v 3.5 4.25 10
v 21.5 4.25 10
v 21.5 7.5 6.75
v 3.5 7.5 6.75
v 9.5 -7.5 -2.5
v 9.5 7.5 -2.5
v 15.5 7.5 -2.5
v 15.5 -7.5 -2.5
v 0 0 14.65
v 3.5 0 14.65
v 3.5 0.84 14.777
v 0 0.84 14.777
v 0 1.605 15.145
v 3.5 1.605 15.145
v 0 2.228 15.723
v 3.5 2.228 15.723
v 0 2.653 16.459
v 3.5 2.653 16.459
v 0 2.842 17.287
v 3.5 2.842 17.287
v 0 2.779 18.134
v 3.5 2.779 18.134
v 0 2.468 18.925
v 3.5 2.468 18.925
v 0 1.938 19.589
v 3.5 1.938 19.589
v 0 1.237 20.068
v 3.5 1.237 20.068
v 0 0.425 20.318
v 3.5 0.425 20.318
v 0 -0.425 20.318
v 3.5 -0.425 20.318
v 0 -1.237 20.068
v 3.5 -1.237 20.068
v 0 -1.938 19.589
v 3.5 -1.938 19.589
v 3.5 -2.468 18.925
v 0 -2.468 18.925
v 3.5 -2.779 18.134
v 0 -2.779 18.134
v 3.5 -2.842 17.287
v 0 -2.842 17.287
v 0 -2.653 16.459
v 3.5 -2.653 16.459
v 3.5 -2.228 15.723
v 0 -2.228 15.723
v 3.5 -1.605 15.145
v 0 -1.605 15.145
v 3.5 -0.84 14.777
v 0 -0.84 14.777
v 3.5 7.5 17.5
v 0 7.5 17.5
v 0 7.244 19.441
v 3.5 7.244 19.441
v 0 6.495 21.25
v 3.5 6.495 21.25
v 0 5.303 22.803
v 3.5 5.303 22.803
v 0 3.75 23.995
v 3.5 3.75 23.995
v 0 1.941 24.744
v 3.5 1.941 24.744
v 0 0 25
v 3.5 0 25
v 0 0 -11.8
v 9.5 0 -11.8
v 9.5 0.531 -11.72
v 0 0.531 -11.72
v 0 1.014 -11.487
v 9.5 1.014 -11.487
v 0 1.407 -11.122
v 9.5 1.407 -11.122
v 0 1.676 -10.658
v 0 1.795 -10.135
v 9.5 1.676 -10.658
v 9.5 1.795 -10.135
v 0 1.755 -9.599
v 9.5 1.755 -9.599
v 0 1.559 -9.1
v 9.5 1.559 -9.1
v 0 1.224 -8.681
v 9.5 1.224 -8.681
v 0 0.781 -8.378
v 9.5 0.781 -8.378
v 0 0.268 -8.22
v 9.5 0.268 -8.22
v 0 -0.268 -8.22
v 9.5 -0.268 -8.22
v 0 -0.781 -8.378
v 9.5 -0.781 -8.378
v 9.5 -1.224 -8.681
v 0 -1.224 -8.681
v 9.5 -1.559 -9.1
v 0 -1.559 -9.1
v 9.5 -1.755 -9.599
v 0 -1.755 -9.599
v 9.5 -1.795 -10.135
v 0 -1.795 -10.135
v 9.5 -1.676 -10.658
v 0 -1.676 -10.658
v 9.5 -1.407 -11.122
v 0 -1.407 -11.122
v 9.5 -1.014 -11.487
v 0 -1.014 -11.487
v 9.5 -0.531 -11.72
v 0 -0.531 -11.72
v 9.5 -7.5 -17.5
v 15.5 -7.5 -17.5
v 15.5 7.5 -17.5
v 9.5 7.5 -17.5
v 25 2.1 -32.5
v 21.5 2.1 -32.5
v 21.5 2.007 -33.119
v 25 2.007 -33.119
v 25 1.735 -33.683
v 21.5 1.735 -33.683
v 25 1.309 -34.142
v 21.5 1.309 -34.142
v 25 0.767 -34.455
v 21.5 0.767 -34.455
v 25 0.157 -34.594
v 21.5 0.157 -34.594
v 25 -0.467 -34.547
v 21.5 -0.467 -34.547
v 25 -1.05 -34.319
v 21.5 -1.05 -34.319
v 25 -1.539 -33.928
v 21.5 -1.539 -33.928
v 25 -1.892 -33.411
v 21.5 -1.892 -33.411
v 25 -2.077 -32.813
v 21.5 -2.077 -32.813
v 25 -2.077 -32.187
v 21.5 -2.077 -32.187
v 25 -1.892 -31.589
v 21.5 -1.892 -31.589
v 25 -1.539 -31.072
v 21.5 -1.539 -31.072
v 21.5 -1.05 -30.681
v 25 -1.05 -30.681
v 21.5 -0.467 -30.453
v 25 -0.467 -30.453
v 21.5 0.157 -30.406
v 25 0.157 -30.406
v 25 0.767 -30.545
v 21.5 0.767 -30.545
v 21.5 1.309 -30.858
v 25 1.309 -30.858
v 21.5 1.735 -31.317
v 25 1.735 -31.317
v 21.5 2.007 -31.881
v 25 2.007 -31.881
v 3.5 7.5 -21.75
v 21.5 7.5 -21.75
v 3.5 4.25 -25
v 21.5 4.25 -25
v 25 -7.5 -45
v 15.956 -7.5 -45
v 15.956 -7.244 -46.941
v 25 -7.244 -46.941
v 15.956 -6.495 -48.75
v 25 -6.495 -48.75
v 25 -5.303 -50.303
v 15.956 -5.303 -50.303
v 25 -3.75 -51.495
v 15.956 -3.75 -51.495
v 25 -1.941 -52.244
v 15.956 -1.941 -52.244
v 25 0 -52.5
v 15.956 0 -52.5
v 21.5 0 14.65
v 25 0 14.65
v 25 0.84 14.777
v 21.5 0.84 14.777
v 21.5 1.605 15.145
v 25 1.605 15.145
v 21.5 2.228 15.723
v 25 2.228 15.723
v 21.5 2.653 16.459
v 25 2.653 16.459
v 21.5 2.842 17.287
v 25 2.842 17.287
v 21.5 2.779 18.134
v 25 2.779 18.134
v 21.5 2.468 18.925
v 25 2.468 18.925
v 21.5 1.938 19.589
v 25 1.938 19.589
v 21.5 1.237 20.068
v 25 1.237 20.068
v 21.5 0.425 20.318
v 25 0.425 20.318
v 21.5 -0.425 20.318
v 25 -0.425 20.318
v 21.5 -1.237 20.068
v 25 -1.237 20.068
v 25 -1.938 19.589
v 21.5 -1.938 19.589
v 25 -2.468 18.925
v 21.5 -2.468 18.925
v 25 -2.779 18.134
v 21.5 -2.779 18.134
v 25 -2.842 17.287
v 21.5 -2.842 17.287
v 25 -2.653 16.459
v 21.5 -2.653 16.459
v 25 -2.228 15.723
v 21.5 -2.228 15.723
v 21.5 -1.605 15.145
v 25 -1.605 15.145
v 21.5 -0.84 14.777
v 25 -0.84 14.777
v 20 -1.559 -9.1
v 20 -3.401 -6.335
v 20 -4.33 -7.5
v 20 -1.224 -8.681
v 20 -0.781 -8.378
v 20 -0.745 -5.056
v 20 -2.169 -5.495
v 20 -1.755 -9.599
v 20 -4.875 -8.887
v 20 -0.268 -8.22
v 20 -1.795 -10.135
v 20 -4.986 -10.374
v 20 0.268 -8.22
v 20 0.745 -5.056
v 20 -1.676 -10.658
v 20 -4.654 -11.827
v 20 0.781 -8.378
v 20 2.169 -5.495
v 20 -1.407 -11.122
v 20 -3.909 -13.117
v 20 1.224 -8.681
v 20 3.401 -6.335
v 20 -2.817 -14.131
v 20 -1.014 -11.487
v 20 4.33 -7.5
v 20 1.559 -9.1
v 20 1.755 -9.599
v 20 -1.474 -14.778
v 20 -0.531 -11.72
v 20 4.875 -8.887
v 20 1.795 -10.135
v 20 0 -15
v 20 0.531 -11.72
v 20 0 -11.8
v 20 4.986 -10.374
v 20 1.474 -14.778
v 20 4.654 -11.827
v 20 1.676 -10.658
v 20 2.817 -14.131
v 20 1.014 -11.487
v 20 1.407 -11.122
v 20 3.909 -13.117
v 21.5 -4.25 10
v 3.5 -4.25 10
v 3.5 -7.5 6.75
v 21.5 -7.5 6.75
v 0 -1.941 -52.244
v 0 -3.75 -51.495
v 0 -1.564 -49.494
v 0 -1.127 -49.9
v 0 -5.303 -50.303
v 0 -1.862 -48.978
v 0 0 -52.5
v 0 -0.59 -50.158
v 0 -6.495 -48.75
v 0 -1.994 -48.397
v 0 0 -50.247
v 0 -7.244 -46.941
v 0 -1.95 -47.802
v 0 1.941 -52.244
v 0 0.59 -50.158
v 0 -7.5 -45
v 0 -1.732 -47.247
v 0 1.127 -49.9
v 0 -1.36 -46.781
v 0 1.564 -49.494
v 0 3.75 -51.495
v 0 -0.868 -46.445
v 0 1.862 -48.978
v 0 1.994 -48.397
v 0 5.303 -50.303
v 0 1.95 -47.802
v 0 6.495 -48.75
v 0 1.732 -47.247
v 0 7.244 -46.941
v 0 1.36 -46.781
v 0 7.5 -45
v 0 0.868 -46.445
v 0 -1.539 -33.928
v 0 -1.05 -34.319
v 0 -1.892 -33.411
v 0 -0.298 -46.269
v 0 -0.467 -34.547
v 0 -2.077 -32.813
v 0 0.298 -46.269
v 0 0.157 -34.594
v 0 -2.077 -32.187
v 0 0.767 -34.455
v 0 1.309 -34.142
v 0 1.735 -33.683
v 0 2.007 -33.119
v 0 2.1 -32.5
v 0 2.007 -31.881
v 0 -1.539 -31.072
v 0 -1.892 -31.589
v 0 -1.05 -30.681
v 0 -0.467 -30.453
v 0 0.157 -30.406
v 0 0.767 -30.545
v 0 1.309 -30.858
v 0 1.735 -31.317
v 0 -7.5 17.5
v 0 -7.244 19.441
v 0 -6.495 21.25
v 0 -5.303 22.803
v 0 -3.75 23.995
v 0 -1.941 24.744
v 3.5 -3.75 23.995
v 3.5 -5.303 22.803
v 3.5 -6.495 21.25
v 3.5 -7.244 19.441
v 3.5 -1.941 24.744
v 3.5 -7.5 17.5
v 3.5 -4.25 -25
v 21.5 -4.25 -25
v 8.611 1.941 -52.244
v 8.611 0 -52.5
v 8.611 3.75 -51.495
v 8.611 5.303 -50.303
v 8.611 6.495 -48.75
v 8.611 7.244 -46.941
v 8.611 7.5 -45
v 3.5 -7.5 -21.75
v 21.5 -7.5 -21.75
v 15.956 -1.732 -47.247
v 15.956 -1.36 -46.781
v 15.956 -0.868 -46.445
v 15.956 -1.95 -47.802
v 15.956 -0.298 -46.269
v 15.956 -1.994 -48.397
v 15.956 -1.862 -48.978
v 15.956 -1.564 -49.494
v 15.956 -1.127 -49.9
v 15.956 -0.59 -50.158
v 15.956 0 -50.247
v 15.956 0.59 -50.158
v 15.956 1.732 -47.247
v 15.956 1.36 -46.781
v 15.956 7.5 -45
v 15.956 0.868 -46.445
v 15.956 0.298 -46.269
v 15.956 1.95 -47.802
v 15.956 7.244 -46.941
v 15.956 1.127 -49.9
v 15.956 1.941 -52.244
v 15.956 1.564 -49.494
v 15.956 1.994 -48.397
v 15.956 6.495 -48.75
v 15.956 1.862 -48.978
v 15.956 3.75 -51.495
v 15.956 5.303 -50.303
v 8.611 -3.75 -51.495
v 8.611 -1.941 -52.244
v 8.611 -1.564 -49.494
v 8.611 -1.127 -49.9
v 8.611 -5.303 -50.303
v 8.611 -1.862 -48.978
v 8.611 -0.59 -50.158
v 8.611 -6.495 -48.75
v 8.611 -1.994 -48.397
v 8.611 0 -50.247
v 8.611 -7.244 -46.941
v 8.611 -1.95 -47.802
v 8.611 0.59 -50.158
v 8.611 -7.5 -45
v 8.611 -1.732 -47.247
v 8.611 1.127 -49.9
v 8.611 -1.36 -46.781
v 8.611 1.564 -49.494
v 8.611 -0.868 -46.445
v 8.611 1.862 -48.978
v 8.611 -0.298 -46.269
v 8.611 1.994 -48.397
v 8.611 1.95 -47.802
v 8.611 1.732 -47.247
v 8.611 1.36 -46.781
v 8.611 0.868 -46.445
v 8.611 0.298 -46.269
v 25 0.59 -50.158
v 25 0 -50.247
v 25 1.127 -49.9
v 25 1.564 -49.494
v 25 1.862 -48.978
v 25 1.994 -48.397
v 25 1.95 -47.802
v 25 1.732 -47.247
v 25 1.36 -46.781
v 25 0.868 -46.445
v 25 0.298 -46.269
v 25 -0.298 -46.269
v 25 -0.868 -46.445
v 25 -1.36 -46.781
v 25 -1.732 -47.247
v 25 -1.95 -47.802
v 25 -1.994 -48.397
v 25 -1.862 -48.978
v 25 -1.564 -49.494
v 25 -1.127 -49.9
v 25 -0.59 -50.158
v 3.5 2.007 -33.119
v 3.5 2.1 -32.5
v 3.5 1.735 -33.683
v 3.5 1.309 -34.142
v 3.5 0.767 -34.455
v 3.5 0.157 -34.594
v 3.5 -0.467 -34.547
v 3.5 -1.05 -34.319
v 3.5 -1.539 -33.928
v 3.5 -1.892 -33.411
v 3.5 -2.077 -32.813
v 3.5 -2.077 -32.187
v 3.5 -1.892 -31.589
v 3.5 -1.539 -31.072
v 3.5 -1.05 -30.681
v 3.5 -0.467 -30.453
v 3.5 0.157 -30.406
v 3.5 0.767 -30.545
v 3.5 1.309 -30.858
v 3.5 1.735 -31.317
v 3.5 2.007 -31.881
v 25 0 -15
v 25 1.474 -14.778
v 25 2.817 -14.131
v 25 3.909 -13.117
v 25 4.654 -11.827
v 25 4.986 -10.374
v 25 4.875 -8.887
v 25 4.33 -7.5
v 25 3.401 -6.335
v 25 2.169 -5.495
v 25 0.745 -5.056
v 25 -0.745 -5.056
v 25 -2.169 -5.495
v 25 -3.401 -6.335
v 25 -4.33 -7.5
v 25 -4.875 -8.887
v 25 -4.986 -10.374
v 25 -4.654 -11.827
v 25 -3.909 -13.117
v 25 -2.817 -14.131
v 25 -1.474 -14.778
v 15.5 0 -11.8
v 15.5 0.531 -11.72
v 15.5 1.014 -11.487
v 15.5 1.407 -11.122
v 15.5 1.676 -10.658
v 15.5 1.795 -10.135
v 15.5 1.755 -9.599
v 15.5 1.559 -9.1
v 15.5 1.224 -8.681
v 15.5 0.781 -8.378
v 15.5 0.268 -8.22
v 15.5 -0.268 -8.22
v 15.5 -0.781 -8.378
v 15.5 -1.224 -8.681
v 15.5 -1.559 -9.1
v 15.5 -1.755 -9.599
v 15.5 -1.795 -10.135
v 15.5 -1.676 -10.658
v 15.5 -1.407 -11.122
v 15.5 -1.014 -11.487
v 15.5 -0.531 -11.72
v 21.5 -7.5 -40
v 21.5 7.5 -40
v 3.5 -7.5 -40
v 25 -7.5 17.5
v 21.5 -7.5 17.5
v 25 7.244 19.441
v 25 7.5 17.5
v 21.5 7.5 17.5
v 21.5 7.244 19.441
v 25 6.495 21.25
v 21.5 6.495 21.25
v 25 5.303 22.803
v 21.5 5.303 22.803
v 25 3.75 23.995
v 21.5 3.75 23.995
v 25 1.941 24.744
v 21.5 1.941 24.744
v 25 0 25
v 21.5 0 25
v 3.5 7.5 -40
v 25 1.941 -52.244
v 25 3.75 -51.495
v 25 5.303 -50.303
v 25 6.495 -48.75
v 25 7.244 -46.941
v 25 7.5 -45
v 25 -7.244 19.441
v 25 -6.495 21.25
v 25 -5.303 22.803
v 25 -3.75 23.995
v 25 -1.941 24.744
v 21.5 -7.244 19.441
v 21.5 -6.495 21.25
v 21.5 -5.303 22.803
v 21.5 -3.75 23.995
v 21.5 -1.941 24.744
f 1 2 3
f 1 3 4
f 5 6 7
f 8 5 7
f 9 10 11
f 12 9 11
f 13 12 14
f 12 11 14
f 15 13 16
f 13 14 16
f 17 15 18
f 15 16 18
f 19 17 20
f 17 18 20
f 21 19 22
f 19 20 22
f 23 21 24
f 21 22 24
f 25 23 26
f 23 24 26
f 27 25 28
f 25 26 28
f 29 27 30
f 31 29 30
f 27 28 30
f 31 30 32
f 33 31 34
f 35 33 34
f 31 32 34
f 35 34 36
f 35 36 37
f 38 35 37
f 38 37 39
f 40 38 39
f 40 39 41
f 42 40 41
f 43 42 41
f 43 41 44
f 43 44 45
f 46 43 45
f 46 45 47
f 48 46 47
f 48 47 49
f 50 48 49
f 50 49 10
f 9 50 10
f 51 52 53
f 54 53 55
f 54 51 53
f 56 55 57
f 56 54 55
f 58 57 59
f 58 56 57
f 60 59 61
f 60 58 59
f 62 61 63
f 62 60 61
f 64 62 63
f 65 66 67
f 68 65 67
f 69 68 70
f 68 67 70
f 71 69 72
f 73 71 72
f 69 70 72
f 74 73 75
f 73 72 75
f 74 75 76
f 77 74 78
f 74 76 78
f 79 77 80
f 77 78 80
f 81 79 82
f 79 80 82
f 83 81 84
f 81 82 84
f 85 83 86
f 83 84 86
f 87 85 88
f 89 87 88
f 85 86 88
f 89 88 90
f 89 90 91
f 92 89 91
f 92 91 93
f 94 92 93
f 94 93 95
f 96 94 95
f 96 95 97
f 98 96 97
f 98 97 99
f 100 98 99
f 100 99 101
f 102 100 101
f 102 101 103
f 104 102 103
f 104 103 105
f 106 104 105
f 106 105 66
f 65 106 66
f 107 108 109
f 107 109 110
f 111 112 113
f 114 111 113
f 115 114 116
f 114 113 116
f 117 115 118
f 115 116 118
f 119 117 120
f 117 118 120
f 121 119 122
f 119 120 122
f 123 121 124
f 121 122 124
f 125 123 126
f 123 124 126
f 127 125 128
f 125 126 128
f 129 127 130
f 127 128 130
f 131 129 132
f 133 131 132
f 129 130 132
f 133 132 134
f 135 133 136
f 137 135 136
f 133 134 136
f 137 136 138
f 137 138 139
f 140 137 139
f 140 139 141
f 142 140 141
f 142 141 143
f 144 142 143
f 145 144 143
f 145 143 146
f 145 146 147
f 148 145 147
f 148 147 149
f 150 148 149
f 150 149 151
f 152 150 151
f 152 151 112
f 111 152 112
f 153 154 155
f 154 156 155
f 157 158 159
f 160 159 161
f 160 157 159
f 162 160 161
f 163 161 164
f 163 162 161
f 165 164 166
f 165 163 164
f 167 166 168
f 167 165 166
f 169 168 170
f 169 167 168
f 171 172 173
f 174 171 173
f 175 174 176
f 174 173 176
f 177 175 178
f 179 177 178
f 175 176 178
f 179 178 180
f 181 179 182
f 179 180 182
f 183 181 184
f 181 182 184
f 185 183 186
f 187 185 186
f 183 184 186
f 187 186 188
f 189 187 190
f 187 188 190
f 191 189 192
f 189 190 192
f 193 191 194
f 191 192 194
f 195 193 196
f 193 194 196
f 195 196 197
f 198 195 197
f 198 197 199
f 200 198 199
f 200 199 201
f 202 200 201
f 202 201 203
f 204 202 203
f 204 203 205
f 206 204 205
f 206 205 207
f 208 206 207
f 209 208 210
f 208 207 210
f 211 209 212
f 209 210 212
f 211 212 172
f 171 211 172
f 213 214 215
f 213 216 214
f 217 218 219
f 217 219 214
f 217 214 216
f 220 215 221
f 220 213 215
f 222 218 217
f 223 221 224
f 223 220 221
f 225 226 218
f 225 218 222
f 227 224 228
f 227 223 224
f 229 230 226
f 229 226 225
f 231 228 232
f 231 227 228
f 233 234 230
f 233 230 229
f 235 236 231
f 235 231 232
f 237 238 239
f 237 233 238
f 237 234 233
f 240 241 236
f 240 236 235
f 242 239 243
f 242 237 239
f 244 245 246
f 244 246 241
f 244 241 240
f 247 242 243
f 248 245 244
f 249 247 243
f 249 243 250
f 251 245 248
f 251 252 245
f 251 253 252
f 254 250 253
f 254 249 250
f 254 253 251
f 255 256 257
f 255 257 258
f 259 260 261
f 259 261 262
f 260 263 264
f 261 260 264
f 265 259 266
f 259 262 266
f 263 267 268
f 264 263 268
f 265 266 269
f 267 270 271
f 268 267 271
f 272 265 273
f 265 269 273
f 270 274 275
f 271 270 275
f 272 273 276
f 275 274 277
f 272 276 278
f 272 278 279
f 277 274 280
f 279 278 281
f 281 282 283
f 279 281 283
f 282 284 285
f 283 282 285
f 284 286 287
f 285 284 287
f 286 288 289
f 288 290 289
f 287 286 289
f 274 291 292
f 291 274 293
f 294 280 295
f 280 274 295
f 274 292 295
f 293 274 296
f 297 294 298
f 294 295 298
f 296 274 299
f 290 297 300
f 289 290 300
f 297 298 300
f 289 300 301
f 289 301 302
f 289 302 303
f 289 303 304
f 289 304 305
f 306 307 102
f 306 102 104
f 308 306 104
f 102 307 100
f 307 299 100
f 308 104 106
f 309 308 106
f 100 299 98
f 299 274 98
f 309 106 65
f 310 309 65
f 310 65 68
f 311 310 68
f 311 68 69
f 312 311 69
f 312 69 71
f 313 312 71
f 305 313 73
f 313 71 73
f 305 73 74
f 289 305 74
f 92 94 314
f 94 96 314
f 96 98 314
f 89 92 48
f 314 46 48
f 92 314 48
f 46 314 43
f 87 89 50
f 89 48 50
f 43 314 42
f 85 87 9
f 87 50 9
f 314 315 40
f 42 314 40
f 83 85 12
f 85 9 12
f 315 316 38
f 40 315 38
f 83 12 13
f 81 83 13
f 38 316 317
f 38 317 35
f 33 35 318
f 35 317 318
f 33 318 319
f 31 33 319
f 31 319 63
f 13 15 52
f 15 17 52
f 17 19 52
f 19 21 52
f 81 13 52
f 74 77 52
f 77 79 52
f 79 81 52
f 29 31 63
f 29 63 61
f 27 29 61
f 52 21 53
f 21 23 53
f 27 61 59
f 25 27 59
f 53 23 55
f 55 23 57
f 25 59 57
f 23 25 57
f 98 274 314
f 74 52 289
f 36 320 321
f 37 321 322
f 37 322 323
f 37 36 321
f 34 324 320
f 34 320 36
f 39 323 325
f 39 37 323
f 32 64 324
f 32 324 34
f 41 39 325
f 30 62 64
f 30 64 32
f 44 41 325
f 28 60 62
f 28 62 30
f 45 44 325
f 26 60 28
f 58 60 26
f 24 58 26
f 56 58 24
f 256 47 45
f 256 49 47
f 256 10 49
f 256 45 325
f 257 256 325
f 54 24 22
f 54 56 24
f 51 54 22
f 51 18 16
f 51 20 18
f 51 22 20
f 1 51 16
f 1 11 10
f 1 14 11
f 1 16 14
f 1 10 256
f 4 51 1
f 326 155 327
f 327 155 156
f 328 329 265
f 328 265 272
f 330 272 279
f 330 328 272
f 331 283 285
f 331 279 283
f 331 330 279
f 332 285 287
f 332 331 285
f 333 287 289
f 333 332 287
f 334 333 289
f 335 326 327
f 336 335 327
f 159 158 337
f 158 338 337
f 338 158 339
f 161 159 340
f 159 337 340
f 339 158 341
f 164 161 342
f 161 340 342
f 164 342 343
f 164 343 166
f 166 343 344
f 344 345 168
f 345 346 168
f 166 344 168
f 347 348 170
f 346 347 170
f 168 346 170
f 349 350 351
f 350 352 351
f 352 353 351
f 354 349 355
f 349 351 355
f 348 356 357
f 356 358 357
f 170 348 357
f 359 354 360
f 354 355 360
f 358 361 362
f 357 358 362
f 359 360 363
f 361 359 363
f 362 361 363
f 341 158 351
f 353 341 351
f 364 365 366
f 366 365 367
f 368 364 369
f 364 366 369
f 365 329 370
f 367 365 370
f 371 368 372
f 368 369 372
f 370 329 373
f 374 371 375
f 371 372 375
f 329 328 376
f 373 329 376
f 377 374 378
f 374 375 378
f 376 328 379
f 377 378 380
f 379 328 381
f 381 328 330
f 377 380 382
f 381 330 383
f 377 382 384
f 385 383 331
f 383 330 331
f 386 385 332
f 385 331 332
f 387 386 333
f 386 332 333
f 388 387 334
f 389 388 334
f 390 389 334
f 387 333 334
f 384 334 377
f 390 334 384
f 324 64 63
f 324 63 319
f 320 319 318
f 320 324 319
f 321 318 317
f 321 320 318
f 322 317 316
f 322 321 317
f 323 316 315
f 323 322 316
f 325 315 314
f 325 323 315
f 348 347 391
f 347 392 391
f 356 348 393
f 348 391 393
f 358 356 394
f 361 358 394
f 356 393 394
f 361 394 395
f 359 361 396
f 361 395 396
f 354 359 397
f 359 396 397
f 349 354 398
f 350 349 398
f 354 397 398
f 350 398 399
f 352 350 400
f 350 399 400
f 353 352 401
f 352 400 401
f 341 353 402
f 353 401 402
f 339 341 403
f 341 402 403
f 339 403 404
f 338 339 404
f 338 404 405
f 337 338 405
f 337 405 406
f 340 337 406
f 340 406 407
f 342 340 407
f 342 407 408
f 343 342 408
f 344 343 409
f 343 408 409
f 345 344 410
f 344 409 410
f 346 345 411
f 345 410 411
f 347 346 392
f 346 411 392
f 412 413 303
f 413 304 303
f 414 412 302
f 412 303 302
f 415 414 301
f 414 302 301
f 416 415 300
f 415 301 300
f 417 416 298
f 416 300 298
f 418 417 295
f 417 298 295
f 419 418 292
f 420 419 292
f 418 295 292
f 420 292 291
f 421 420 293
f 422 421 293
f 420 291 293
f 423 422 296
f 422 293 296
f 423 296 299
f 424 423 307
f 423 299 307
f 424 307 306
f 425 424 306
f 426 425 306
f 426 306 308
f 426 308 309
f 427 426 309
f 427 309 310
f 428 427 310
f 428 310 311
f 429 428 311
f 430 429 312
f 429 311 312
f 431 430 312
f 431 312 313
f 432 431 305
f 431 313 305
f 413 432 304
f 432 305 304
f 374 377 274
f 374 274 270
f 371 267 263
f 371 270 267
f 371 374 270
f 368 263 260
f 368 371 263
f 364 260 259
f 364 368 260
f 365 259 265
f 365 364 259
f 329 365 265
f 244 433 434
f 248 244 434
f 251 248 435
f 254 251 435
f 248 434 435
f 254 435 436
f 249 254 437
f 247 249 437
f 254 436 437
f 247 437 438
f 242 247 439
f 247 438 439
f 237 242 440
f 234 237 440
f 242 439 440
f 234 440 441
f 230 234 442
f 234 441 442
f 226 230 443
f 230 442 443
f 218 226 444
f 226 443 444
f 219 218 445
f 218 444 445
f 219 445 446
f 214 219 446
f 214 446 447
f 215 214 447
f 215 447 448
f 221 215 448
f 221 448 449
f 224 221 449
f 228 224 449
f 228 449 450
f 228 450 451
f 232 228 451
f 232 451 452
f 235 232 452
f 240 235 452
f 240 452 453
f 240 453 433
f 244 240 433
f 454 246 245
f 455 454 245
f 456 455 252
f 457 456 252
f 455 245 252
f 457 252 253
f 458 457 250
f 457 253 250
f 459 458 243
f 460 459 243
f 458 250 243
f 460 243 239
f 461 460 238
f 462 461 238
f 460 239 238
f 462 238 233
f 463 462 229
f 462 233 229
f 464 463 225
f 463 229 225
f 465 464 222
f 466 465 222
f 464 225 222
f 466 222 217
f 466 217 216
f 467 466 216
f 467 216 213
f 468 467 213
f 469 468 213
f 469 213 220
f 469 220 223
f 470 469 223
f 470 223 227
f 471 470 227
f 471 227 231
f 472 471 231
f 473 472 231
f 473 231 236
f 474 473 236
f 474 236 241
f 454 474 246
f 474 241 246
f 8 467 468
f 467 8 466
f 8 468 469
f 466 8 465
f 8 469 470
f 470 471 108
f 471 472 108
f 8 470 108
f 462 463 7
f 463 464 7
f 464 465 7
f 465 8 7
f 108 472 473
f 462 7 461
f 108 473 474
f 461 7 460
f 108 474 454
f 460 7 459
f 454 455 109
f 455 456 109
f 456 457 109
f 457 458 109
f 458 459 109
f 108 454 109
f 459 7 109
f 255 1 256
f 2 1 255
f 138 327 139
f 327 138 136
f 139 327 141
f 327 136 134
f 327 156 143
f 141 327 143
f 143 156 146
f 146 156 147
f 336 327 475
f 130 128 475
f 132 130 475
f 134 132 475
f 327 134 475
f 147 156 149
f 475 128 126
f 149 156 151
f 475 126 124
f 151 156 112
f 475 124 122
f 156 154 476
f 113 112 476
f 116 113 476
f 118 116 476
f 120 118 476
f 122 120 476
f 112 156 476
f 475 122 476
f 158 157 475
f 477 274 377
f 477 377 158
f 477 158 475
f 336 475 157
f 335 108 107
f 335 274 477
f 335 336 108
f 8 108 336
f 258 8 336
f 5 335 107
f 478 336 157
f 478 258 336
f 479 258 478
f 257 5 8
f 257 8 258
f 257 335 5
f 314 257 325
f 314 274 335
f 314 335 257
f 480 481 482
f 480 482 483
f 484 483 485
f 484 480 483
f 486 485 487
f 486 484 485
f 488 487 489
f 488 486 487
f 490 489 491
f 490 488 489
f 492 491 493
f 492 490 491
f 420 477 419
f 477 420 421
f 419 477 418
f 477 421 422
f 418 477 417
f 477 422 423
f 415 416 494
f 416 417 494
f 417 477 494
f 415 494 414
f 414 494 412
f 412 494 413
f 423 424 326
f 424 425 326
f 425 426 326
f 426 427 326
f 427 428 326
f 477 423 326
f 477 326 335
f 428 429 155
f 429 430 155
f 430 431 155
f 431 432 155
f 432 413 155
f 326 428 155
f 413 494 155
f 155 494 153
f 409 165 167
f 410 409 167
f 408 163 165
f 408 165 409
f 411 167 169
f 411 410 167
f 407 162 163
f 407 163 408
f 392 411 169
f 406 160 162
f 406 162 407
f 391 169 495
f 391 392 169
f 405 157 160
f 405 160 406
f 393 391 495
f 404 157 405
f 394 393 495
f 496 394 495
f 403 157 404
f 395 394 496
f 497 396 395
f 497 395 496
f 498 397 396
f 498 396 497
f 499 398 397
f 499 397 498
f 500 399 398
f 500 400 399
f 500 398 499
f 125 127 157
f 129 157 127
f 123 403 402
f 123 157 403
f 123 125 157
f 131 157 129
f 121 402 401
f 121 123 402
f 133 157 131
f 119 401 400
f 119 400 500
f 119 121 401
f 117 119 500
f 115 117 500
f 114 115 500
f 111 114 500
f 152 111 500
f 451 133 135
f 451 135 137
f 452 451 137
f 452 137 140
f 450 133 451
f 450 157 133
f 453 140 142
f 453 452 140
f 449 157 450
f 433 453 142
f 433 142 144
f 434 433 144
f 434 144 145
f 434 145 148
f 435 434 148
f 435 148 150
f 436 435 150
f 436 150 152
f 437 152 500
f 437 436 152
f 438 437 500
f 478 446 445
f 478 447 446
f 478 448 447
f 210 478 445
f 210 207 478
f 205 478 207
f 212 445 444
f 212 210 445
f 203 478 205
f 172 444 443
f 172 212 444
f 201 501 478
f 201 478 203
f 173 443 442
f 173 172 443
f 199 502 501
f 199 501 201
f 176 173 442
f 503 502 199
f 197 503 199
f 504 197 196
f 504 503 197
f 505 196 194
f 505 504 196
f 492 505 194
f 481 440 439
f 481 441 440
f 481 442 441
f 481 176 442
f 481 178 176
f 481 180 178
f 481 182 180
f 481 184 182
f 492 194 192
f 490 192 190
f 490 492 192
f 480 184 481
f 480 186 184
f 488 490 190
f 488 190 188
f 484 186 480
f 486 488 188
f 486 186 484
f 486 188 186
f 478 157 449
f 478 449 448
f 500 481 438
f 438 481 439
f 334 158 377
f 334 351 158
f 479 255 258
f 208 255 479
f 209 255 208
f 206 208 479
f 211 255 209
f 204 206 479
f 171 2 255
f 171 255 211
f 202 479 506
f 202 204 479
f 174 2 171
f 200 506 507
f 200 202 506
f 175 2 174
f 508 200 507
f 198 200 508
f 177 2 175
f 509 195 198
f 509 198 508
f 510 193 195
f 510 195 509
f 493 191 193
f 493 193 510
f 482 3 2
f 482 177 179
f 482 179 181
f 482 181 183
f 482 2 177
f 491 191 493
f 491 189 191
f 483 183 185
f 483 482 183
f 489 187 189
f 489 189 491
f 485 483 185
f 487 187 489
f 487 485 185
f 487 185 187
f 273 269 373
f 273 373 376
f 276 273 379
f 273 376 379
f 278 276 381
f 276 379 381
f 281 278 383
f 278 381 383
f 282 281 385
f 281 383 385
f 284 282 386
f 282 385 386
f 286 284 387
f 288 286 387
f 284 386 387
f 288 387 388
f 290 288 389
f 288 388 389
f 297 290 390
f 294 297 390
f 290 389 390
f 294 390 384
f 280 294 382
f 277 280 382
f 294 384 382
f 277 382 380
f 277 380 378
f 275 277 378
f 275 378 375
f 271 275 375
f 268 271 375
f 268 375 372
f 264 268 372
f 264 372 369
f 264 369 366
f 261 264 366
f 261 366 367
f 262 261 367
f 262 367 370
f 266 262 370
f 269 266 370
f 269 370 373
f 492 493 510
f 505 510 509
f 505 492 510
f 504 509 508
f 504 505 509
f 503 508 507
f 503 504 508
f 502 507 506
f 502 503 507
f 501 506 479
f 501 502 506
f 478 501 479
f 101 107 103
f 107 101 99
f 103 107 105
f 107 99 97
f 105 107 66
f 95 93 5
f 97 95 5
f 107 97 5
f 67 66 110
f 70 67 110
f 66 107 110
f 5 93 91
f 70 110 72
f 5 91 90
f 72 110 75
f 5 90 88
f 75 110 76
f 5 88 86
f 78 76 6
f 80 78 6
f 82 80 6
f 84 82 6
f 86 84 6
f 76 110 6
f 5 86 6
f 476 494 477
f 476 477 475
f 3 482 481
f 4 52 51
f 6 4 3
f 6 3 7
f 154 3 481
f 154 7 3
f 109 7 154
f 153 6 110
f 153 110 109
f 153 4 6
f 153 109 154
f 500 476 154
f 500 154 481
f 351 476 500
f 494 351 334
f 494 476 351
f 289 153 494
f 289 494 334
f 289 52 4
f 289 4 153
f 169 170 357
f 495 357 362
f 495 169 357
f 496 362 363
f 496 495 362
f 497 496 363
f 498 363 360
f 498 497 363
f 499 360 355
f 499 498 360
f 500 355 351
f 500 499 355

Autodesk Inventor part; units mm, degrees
ref_plane "YZ Plane" through (0, 0, 0) normal (1, 0, 0) x (0, 1, 0)
ref_plane "XZ Plane" through (0, 0, 0) normal (0, 1, 0) x (-1, 0, 0)
ref_plane "XY Plane" through (0, 0, 0) normal (0, 0, 1) x (1, 0, 0)
sketch "Эскиз1" plane through (0, 0, 0) normal (1, 0, 0) x (0, 1, 0)
  line L0 (-7.5, 25) -> (7.5, 25)
  line L1 (7.5, 25) -> (7.5, -25)
  line L2 (7.5, -25) -> (-7.5, -25)
  line L3 (-7.5, -25) -> (-7.5, 25)
  line L4 (-7.5, 25) -> (7.5, -25) construction
  line L5 (7.5, 25) -> (-7.5, -25) construction
  line L6 (0, -25) -> (0, -32.5)
  arc A0 (-7.5, -32.5) -> (7.5, -32.5) centre (0, -32.5) ccw
  line L7 (-7.5, -25) -> (-7.5, -32.5)
  line L8 (7.5, -25) -> (7.5, -32.5)
  circle A1 centre (0, -32.5) radius 2.1
  line L9 (-7.5, -32.5) -> (-7.5, -44.5)
  line L10 (-7.5, -44.5) -> (7.5, -44.5)
  line L11 (7.5, -44.5) -> (7.5, -32.5)
  line L12 (7.5, -32.5) -> (2.1, -32.5)
  line L13 (-2.1, -32.5) -> (-7.5, -32.5)
  line L14 (7.5, -44.5) -> (-7.5, -44.5)
  line L15 (-7.5, -44.5) -> (-7.5, -52.5)
  line L16 (-7.5, -52.5) -> (7.5, -52.5)
  line L17 (7.5, -52.5) -> (7.5, -44.5)
  point P0 (0, 0)
  dimension "d0" = 15
  dimension "d1" = 50
  dimension "d4" = 4.2
  dimension "d31" = 15
  dimension "d32" = 12
  dimension "d34" = 8
extrude "Выдавливание1" add sketch "Эскиз1" along normal blind 25 contours L0 L1 L2 L3 | L2 L6 A1 L13 L7 | L8 L12 A1 L6 L2 | L13 A1 L12 A0 | A0 L11 L10 L9 | L10 L17 L16 L15
sketch "Эскиз2" plane through (0, 7.5, 25) normal (0, 1, 0) x (1, 0, 0)
  line L0 (0, 65) -> (25, 65) projected
  line L1 (3.5, 50) -> (21.5, 50)
  line L2 (21.5, 50) -> (21.5, 65)
  line L3 (21.5, 65) -> (3.5, 65)
  line L4 (3.5, 65) -> (3.5, 50)
  line L5 (0, 57.5) -> (25, 57.5) projected
  line L6 (3.5, 50) -> (21.5, 65) construction
  line L7 (21.5, 50) -> (3.5, 65) construction
  point P0 (0, 25)
  point P1 (12.5, 57.5)
  dimension "d7" = 18
extrude "Выдавливание2" cut sketch "Эскиз2" against normal blind 25
sketch "Эскиз3" plane through (0, 7.5, 25) normal (0, 1, 0) x (1, 0, 0)
  line L0 (21.5, 50) -> (3.5, 50) projected
  line L1 (12.5, 50) -> (12.5, 35)
  line L2 (9.5, 27.5) -> (15.5, 27.5)
  line L3 (15.5, 27.5) -> (15.5, 42.5)
  line L4 (15.5, 42.5) -> (9.5, 42.5)
  line L5 (9.5, 42.5) -> (9.5, 27.5)
  line L6 (9.5, 27.5) -> (15.5, 42.5) construction
  line L7 (15.5, 27.5) -> (9.5, 42.5) construction
  point P0 (0, 25)
  dimension "d10" = 15
  dimension "d11" = 6
  dimension "d12" = 15
extrude "Выдавливание3" cut sketch "Эскиз3" against normal blind 25
sketch "Эскиз4" plane through (25, 0, 0) normal (1, 0, 0) x (0, 0, -1)
  line L0 (2.5, 7.5) -> (2.5, -7.5) projected
  line L1 (17.5, 7.5) -> (17.5, -7.5) projected
  line L2 (2.5, 7.5) -> (2.5, -7.5) projected
  line L3 (2.5, 0) -> (17.5, 0)
  circle A0 centre (10, 0) radius 1.8
  point P0 (0, 0)
  dimension "d15" = 3.6
extrude "Выдавливание4" cut sketch "Эскиз4" against normal blind 25
sketch "Эскиз5" plane through (25, 0, 0) normal (1, 0, 0) x (0, 0, -1)
  circle A0 centre (10, 0) radius 1.8 projected
  circle A1 centre (10, 0) radius 5
  point P0 (0, 0)
  dimension "d18" = 10
extrude "Выдавливание5" cut sketch "Эскиз5" against normal blind 5
fillet "Сопряжение1" radius 7.5 2 edges at (12.5, 7.5, 25) (12.5, -7.5, 25)
sketch "Эскиз6" plane through (25, 0, 0) normal (1, 0, 0) x (0, 0, -1)
  arc A0 (-17.5, 7.5) -> (-17.5, -7.5) centre (-17.5, 0) ccw projected
  circle A1 centre (-17.5, 0) radius 2.85
  point P0 (0, 0)
  dimension "d22" = 5.7
extrude "Выдавливание6" cut sketch "Эскиз6" against normal blind 25
sketch "Эскиз7" plane through (3.5, 7.5, -25) normal (0, 1, 0) x (1, 0, 0)
  line L0 (-3.5, -50) -> (21.5, -50) projected
  line L1 (0, -35) -> (18, -35)
  line L2 (18, -35) -> (18, -50)
  line L3 (18, -50) -> (0, -50)
  line L4 (0, -50) -> (0, -35)
  line L5 (-3.5, -42.5) -> (21.5, -42.5) projected
  line L6 (0, -35) -> (18, -50) construction
  line L7 (18, -35) -> (0, -50) construction
  point P0 (-3.5, -25)
  point P1 (9, -42.5)
  dimension "d25" = 18
extrude "Выдавливание7" cut sketch "Эскиз7" against normal blind 25
chamfer "Фаска1" distance 3.25 angle 45 4 edges at (12.5, 7.5, 10) (12.5, -7.5, 10) (12.5, 7.5, -25) (12.5, -7.5, -25)
fillet "Сопряжение3" radius 7.5 2 edges at (12.5, 7.5, -52.5) (12.5, -7.5, -52.5)
sketch "Эскиз8" plane through (25, 0, 0) normal (1, 0, 0) x (0, 0, -1)
  circle A0 centre (48.2471, 0) radius 2
  point P0 (0, 0)
  dimension "d36" = 4
extrude "Выдавливание8" cut sketch "Эскиз8" against normal blind 25
sketch "Эскиз9" plane through (0, 7.5, 17.5) normal (0, 1, 0) x (1, 0, 0)
  line L0 (25, 62.5) -> (0, 62.5) projected
  line L1 (0, 70) -> (25, 70) projected
  line L2 (8.611, 62.5) -> (15.9557, 62.5)
  line L3 (15.9557, 62.5) -> (15.9557, 70)
  line L4 (15.9557, 70) -> (8.611, 70)
  line L5 (8.611, 70) -> (8.611, 62.5)
  point P0 (0, 17.5)
extrude "Выдавливание9" cut sketch "Эскиз9" against normal blind 25
properties part number "КВ33.044.602 - Держатель катка"
